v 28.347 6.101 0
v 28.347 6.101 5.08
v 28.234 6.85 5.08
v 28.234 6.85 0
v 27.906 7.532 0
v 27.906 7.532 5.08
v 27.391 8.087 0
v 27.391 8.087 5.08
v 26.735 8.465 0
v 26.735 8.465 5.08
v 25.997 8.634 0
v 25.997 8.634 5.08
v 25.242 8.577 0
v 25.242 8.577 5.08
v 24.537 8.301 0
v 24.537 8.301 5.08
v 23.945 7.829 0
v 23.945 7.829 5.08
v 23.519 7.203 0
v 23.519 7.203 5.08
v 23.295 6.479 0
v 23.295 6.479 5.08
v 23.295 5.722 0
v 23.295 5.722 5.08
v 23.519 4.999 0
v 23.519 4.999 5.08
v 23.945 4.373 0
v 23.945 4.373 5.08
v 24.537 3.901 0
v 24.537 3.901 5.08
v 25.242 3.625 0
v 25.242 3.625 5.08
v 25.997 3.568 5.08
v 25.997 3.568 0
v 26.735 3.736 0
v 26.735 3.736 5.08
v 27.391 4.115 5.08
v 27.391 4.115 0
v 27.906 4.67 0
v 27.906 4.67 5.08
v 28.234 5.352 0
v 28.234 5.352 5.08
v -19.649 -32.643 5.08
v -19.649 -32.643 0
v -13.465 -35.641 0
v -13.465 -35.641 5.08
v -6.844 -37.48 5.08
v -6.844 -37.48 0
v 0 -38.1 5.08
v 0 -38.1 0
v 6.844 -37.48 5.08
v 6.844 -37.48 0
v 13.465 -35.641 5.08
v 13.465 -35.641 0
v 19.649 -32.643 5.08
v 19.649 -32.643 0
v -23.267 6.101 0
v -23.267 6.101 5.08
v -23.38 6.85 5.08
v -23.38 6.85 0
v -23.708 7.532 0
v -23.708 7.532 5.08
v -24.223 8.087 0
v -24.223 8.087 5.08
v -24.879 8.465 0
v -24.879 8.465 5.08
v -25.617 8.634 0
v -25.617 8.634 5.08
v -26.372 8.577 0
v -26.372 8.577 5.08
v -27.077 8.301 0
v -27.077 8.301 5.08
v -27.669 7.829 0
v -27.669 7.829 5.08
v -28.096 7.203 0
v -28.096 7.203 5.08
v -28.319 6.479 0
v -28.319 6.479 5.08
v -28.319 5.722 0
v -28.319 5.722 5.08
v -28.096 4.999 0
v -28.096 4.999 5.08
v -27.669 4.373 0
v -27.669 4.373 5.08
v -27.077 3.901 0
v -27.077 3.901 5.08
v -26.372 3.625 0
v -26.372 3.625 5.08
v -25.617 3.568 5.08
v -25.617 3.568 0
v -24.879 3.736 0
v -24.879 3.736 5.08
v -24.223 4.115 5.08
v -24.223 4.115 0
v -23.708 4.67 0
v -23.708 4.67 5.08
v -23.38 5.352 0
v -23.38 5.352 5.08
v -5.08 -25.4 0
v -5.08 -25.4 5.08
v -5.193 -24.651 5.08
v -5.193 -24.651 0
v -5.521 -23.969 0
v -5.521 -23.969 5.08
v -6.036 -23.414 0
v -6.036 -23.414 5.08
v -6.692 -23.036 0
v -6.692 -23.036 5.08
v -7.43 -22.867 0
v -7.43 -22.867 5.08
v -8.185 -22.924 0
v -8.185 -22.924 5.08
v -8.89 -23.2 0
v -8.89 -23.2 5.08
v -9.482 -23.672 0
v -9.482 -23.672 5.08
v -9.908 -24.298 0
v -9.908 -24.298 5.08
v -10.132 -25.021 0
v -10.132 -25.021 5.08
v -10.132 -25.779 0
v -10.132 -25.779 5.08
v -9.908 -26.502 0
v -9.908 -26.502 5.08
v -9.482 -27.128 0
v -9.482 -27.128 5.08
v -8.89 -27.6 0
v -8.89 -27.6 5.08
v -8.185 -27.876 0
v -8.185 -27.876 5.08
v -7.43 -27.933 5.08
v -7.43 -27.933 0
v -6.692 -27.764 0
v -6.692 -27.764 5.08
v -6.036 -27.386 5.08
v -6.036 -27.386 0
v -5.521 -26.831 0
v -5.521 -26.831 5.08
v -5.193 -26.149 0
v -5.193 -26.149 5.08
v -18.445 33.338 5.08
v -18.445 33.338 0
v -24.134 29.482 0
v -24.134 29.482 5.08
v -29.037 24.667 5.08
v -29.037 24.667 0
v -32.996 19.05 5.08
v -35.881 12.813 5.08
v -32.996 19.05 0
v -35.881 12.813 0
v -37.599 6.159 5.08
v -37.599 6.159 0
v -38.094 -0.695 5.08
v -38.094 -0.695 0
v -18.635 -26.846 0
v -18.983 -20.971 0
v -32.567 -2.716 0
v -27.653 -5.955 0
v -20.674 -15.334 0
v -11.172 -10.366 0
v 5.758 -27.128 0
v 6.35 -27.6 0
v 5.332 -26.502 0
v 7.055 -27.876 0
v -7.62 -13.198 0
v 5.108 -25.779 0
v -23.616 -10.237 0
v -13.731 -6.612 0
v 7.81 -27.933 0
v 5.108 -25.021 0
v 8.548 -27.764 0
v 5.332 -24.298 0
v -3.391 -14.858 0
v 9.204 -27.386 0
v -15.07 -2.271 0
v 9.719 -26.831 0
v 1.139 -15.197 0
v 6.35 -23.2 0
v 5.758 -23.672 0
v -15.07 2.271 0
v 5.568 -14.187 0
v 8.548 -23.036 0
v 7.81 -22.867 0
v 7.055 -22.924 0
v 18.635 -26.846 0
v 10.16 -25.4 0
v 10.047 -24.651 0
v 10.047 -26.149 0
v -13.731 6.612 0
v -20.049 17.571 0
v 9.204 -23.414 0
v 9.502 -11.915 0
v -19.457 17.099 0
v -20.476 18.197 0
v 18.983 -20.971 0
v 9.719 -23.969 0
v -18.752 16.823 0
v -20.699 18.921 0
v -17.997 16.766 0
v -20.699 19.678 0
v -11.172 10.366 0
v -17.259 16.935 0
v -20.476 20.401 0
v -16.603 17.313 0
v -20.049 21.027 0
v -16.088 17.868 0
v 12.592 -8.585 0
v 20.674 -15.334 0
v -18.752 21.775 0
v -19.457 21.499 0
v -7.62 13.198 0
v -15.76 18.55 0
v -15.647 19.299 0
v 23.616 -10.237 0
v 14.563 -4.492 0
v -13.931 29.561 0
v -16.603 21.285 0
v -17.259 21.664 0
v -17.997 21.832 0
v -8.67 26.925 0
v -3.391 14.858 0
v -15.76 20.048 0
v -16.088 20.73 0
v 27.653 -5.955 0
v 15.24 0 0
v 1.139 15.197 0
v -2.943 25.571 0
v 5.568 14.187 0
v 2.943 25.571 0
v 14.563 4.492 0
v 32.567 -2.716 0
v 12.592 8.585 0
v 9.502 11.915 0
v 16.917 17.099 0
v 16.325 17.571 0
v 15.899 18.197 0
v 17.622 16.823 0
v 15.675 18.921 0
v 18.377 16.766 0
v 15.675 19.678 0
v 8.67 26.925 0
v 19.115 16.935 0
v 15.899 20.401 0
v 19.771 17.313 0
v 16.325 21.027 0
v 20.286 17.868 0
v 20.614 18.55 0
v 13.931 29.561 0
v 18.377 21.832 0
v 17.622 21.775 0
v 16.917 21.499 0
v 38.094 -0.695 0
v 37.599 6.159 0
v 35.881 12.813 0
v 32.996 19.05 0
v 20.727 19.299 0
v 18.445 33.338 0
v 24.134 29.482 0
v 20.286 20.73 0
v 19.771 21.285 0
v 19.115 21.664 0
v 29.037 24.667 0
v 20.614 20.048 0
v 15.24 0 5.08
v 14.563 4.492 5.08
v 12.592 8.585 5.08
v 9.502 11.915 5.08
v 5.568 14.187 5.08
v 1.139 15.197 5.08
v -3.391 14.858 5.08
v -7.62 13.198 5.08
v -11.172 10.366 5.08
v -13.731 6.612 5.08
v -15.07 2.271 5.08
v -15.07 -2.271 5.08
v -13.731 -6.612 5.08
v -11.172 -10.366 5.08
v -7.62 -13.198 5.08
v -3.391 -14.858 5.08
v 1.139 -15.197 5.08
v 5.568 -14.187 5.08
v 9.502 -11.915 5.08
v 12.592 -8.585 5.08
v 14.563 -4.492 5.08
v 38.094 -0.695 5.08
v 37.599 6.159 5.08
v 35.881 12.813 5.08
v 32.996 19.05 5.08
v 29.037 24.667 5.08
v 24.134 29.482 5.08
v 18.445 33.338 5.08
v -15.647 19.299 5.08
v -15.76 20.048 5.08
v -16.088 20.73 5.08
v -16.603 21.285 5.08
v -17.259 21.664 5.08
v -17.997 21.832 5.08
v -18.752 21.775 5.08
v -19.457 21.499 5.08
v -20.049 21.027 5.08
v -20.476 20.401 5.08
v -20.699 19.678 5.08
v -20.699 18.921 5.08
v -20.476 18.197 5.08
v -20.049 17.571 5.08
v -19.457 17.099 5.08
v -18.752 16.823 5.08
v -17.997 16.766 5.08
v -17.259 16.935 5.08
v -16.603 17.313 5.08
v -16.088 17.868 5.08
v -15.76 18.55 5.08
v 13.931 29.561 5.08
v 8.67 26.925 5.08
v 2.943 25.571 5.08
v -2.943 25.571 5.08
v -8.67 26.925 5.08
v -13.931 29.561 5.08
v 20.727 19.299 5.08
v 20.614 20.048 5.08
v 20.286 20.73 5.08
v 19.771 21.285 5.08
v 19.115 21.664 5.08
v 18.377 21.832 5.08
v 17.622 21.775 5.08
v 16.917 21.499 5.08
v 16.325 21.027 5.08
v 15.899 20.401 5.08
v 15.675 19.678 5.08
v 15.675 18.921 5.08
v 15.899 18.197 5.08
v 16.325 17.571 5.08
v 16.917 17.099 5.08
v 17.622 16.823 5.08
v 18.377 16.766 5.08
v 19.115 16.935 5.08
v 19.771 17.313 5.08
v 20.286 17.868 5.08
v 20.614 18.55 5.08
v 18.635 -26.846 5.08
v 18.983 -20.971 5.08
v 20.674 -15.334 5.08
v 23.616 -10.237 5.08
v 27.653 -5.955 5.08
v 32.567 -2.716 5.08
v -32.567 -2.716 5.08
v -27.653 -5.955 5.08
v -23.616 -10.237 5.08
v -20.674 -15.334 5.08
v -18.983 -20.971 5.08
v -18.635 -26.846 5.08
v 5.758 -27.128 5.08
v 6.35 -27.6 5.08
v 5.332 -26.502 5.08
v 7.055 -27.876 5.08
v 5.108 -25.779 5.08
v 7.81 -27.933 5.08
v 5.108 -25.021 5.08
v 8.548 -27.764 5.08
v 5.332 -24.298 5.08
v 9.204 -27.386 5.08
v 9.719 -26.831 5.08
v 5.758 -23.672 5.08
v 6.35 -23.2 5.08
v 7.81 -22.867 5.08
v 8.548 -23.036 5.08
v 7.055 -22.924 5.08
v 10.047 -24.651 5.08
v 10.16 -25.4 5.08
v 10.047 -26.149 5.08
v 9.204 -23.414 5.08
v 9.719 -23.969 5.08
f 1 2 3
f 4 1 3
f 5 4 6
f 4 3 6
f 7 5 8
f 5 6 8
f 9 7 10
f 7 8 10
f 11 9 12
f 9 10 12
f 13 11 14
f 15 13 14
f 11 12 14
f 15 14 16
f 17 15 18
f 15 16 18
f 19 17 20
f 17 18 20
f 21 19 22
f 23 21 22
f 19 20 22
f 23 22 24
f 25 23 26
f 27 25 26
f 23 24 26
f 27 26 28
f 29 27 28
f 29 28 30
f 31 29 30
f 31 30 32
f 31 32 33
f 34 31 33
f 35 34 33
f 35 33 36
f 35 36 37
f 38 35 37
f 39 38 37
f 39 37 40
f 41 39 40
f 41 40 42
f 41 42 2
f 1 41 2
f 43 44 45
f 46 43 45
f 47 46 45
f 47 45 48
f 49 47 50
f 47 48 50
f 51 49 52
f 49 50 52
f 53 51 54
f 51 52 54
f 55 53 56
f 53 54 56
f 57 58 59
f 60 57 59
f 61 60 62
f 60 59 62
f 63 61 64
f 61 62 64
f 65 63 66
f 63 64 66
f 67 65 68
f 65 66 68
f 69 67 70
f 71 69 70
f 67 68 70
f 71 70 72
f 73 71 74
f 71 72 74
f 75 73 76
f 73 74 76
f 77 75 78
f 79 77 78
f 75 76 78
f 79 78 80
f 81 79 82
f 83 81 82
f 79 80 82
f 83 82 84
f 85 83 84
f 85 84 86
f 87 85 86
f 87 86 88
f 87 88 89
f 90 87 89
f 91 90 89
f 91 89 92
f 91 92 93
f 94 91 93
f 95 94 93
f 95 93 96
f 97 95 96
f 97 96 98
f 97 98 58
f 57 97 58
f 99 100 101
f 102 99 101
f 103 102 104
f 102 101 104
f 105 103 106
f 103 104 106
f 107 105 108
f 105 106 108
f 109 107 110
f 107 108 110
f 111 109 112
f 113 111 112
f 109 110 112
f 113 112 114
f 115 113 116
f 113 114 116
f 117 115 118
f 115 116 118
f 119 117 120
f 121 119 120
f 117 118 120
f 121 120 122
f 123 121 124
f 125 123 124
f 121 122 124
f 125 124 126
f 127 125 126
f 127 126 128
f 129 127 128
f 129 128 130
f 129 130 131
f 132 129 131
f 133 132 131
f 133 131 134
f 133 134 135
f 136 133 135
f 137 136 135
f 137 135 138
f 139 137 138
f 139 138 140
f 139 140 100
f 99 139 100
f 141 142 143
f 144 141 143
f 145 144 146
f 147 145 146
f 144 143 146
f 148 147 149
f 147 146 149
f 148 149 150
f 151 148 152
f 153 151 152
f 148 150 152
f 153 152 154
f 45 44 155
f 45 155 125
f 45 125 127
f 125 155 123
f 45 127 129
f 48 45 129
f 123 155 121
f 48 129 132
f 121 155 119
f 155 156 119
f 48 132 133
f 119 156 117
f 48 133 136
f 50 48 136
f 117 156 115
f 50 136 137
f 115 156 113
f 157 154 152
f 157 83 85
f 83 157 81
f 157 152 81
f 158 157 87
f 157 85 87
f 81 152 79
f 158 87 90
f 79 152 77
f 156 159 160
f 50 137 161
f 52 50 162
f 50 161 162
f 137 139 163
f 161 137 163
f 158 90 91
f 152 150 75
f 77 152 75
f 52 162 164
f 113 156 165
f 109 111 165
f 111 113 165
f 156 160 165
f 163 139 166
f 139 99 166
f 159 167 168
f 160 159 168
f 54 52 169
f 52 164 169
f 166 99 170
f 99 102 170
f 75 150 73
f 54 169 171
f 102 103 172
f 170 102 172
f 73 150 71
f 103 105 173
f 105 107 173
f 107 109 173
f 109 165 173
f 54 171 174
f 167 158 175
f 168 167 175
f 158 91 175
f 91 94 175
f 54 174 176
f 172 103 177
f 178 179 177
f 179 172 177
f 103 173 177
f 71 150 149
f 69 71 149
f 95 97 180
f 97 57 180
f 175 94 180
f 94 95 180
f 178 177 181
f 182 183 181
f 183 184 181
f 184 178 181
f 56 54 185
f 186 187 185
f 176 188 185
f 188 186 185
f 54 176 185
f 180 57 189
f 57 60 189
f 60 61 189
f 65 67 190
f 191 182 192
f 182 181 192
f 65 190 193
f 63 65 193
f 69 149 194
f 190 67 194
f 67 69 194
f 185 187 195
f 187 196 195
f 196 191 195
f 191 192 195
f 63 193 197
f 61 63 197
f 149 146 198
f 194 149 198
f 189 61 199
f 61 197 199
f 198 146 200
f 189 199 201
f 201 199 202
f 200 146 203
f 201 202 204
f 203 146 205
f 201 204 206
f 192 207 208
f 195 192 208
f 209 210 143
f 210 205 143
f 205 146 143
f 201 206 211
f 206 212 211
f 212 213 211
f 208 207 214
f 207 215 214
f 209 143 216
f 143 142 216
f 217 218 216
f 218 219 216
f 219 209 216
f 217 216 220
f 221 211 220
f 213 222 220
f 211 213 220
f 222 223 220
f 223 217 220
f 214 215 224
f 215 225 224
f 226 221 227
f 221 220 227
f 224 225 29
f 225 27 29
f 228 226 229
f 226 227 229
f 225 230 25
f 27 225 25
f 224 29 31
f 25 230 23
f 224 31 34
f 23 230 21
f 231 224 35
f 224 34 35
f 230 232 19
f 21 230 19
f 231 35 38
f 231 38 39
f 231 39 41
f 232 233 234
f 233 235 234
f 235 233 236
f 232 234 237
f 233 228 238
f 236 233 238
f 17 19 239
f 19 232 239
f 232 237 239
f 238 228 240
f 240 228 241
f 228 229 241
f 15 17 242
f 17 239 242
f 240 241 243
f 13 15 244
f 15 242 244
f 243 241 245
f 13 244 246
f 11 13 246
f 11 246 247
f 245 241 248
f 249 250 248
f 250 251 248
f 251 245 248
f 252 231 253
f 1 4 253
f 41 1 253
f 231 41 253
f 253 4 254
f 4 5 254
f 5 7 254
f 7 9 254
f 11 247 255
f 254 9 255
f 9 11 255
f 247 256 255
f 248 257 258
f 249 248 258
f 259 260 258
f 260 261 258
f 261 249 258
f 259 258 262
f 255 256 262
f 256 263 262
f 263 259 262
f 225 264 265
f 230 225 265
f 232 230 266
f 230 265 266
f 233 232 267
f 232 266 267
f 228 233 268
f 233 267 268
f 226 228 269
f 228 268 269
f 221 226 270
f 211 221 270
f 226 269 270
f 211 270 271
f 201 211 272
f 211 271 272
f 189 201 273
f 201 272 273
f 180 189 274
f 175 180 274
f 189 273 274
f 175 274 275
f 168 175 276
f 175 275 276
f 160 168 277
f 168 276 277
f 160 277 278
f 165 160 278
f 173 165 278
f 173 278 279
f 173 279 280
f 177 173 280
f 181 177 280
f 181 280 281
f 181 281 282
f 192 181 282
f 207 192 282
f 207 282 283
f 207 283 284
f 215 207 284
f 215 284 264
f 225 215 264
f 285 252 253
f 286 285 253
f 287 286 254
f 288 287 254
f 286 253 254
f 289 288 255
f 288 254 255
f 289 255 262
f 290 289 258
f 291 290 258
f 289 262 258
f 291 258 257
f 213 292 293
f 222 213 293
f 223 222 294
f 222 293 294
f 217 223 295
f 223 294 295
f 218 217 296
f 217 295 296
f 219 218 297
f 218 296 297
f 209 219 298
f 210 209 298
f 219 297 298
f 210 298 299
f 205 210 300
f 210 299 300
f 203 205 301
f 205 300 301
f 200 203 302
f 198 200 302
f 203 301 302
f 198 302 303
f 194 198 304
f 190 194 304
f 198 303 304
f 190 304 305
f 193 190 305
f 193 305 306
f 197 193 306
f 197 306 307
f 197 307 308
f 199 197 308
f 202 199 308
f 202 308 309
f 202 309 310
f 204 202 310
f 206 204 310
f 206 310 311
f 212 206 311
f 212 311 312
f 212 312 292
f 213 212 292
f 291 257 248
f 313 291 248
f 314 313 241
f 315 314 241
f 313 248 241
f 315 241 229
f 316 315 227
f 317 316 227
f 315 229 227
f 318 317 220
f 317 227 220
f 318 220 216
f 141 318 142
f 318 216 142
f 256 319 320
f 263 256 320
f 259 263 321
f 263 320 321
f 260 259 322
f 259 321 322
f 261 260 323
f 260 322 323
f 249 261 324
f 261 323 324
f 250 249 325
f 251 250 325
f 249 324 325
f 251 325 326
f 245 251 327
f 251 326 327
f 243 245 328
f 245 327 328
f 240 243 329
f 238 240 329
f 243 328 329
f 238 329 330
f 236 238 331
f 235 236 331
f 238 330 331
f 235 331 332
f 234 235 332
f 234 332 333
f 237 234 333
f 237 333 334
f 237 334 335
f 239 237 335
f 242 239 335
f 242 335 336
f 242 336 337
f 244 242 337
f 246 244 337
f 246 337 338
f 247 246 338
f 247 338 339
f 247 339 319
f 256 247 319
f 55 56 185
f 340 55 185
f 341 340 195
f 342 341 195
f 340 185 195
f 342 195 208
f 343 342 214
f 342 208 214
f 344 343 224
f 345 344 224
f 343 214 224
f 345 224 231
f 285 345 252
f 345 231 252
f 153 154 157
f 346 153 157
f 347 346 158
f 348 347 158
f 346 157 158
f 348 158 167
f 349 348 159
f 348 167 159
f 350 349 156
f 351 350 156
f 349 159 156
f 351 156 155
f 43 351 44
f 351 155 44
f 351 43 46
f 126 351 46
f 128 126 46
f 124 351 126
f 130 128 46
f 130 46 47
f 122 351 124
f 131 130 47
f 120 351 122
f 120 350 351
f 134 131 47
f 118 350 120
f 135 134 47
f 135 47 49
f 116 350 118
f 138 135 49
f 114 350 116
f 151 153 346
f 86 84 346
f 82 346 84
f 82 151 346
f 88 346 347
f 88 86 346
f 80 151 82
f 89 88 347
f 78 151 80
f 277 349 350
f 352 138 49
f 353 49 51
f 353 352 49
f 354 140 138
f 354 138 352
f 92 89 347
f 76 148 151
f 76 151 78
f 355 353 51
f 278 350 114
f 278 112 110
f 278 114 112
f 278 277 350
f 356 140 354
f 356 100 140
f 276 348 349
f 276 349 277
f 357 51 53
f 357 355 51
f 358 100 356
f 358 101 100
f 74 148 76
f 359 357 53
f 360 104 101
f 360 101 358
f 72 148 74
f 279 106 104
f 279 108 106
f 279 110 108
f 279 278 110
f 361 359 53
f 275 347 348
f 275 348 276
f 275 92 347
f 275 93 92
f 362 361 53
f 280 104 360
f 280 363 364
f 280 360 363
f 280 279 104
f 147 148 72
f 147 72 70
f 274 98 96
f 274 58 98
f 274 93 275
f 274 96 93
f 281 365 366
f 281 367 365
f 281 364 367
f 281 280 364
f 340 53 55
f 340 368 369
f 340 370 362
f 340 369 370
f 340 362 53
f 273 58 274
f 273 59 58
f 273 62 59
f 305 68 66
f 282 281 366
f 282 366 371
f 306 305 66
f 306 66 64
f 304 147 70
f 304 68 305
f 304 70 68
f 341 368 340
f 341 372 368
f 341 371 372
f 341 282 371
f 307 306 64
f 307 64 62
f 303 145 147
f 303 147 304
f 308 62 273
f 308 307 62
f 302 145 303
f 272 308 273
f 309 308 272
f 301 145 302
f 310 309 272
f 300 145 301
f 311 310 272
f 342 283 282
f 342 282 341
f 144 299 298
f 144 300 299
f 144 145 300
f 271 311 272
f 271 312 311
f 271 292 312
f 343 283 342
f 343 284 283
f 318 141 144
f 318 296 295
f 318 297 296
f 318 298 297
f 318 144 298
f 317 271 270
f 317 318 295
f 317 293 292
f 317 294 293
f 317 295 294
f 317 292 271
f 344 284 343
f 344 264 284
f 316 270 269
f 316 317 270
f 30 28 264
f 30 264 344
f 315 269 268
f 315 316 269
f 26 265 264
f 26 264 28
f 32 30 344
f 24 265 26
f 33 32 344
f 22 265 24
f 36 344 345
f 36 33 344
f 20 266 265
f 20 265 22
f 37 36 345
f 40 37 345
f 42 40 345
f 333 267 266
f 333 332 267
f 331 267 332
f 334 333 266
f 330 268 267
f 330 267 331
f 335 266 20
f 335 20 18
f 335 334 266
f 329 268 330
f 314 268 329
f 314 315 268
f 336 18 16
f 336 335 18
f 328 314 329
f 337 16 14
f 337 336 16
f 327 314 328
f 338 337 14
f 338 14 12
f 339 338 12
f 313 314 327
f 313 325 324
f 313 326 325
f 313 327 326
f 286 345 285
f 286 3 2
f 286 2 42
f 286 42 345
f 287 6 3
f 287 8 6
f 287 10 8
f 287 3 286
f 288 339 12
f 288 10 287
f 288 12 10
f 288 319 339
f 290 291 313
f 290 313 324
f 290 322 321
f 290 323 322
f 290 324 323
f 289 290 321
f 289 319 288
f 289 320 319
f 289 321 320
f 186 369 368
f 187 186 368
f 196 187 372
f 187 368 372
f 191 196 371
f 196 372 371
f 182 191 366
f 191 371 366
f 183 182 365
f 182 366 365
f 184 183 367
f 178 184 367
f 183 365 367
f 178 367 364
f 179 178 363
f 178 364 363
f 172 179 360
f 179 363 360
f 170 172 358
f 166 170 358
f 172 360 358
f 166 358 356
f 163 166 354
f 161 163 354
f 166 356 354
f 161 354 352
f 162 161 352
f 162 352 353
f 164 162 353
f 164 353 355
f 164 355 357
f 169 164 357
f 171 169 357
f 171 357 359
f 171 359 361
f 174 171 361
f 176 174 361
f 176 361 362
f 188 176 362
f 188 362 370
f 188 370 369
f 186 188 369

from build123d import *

# Parameters (mm, degrees)
F1_DEPTH = 5.08
F2_R     = 15.24
F3_DEPTH = 25.4
F2_R_2   = 2.54
F4_DEPTH = 25.4


with BuildPart() as f1:
    # F0 (on Top) → F1 (new body)
    with BuildSketch(Plane.XY):
        with BuildLine():
            ThreePointArc((18.445083, 33.3375), (0, 25.4), (-18.445083, 33.3375))
            ThreePointArc((-18.445083, 33.3375), (-32.995568, 19.05), (-38.093663, -0.694839))
            ThreePointArc((-38.093663, -0.694839), (-21.997045, -12.7), (-19.64858, -32.642661))
            ThreePointArc((-19.64858, -32.642661), (0, -38.1), (19.64858, -32.642661))
            ThreePointArc((19.64858, -32.642661), (21.997045, -12.7), (38.093663, -0.694839))
            ThreePointArc((38.093663, -0.694839), (32.995568, 19.05), (18.445083, 33.3375))
        make_face()
    extrude(amount=F1_DEPTH)

    # F2 (on face) → F3 (cut)
    with BuildSketch(Plane.XY.offset(5.08)):
        Circle(F2_R)
    extrude(amount=-F3_DEPTH, mode=Mode.SUBTRACT)

    # F2 (on face) → F4 (cut)
    with BuildSketch(Plane.XY.offset(5.08)):
        with Locations((7.62, -25.4)):
            Circle(F2_R_2)
        with Locations((-7.62, -25.4)):
            Circle(F2_R_2)
        with Locations((-25.807045, 6.100886)):
            Circle(F2_R_2)
        with Locations((-18.187045, 19.299114)):
            Circle(F2_R_2)
        with Locations((18.187045, 19.299114)):
            Circle(F2_R_2)
        with Locations((25.807045, 6.100886)):
            Circle(F2_R_2)
    extrude(amount=-F4_DEPTH, mode=Mode.SUBTRACT)


solid = f1.part
